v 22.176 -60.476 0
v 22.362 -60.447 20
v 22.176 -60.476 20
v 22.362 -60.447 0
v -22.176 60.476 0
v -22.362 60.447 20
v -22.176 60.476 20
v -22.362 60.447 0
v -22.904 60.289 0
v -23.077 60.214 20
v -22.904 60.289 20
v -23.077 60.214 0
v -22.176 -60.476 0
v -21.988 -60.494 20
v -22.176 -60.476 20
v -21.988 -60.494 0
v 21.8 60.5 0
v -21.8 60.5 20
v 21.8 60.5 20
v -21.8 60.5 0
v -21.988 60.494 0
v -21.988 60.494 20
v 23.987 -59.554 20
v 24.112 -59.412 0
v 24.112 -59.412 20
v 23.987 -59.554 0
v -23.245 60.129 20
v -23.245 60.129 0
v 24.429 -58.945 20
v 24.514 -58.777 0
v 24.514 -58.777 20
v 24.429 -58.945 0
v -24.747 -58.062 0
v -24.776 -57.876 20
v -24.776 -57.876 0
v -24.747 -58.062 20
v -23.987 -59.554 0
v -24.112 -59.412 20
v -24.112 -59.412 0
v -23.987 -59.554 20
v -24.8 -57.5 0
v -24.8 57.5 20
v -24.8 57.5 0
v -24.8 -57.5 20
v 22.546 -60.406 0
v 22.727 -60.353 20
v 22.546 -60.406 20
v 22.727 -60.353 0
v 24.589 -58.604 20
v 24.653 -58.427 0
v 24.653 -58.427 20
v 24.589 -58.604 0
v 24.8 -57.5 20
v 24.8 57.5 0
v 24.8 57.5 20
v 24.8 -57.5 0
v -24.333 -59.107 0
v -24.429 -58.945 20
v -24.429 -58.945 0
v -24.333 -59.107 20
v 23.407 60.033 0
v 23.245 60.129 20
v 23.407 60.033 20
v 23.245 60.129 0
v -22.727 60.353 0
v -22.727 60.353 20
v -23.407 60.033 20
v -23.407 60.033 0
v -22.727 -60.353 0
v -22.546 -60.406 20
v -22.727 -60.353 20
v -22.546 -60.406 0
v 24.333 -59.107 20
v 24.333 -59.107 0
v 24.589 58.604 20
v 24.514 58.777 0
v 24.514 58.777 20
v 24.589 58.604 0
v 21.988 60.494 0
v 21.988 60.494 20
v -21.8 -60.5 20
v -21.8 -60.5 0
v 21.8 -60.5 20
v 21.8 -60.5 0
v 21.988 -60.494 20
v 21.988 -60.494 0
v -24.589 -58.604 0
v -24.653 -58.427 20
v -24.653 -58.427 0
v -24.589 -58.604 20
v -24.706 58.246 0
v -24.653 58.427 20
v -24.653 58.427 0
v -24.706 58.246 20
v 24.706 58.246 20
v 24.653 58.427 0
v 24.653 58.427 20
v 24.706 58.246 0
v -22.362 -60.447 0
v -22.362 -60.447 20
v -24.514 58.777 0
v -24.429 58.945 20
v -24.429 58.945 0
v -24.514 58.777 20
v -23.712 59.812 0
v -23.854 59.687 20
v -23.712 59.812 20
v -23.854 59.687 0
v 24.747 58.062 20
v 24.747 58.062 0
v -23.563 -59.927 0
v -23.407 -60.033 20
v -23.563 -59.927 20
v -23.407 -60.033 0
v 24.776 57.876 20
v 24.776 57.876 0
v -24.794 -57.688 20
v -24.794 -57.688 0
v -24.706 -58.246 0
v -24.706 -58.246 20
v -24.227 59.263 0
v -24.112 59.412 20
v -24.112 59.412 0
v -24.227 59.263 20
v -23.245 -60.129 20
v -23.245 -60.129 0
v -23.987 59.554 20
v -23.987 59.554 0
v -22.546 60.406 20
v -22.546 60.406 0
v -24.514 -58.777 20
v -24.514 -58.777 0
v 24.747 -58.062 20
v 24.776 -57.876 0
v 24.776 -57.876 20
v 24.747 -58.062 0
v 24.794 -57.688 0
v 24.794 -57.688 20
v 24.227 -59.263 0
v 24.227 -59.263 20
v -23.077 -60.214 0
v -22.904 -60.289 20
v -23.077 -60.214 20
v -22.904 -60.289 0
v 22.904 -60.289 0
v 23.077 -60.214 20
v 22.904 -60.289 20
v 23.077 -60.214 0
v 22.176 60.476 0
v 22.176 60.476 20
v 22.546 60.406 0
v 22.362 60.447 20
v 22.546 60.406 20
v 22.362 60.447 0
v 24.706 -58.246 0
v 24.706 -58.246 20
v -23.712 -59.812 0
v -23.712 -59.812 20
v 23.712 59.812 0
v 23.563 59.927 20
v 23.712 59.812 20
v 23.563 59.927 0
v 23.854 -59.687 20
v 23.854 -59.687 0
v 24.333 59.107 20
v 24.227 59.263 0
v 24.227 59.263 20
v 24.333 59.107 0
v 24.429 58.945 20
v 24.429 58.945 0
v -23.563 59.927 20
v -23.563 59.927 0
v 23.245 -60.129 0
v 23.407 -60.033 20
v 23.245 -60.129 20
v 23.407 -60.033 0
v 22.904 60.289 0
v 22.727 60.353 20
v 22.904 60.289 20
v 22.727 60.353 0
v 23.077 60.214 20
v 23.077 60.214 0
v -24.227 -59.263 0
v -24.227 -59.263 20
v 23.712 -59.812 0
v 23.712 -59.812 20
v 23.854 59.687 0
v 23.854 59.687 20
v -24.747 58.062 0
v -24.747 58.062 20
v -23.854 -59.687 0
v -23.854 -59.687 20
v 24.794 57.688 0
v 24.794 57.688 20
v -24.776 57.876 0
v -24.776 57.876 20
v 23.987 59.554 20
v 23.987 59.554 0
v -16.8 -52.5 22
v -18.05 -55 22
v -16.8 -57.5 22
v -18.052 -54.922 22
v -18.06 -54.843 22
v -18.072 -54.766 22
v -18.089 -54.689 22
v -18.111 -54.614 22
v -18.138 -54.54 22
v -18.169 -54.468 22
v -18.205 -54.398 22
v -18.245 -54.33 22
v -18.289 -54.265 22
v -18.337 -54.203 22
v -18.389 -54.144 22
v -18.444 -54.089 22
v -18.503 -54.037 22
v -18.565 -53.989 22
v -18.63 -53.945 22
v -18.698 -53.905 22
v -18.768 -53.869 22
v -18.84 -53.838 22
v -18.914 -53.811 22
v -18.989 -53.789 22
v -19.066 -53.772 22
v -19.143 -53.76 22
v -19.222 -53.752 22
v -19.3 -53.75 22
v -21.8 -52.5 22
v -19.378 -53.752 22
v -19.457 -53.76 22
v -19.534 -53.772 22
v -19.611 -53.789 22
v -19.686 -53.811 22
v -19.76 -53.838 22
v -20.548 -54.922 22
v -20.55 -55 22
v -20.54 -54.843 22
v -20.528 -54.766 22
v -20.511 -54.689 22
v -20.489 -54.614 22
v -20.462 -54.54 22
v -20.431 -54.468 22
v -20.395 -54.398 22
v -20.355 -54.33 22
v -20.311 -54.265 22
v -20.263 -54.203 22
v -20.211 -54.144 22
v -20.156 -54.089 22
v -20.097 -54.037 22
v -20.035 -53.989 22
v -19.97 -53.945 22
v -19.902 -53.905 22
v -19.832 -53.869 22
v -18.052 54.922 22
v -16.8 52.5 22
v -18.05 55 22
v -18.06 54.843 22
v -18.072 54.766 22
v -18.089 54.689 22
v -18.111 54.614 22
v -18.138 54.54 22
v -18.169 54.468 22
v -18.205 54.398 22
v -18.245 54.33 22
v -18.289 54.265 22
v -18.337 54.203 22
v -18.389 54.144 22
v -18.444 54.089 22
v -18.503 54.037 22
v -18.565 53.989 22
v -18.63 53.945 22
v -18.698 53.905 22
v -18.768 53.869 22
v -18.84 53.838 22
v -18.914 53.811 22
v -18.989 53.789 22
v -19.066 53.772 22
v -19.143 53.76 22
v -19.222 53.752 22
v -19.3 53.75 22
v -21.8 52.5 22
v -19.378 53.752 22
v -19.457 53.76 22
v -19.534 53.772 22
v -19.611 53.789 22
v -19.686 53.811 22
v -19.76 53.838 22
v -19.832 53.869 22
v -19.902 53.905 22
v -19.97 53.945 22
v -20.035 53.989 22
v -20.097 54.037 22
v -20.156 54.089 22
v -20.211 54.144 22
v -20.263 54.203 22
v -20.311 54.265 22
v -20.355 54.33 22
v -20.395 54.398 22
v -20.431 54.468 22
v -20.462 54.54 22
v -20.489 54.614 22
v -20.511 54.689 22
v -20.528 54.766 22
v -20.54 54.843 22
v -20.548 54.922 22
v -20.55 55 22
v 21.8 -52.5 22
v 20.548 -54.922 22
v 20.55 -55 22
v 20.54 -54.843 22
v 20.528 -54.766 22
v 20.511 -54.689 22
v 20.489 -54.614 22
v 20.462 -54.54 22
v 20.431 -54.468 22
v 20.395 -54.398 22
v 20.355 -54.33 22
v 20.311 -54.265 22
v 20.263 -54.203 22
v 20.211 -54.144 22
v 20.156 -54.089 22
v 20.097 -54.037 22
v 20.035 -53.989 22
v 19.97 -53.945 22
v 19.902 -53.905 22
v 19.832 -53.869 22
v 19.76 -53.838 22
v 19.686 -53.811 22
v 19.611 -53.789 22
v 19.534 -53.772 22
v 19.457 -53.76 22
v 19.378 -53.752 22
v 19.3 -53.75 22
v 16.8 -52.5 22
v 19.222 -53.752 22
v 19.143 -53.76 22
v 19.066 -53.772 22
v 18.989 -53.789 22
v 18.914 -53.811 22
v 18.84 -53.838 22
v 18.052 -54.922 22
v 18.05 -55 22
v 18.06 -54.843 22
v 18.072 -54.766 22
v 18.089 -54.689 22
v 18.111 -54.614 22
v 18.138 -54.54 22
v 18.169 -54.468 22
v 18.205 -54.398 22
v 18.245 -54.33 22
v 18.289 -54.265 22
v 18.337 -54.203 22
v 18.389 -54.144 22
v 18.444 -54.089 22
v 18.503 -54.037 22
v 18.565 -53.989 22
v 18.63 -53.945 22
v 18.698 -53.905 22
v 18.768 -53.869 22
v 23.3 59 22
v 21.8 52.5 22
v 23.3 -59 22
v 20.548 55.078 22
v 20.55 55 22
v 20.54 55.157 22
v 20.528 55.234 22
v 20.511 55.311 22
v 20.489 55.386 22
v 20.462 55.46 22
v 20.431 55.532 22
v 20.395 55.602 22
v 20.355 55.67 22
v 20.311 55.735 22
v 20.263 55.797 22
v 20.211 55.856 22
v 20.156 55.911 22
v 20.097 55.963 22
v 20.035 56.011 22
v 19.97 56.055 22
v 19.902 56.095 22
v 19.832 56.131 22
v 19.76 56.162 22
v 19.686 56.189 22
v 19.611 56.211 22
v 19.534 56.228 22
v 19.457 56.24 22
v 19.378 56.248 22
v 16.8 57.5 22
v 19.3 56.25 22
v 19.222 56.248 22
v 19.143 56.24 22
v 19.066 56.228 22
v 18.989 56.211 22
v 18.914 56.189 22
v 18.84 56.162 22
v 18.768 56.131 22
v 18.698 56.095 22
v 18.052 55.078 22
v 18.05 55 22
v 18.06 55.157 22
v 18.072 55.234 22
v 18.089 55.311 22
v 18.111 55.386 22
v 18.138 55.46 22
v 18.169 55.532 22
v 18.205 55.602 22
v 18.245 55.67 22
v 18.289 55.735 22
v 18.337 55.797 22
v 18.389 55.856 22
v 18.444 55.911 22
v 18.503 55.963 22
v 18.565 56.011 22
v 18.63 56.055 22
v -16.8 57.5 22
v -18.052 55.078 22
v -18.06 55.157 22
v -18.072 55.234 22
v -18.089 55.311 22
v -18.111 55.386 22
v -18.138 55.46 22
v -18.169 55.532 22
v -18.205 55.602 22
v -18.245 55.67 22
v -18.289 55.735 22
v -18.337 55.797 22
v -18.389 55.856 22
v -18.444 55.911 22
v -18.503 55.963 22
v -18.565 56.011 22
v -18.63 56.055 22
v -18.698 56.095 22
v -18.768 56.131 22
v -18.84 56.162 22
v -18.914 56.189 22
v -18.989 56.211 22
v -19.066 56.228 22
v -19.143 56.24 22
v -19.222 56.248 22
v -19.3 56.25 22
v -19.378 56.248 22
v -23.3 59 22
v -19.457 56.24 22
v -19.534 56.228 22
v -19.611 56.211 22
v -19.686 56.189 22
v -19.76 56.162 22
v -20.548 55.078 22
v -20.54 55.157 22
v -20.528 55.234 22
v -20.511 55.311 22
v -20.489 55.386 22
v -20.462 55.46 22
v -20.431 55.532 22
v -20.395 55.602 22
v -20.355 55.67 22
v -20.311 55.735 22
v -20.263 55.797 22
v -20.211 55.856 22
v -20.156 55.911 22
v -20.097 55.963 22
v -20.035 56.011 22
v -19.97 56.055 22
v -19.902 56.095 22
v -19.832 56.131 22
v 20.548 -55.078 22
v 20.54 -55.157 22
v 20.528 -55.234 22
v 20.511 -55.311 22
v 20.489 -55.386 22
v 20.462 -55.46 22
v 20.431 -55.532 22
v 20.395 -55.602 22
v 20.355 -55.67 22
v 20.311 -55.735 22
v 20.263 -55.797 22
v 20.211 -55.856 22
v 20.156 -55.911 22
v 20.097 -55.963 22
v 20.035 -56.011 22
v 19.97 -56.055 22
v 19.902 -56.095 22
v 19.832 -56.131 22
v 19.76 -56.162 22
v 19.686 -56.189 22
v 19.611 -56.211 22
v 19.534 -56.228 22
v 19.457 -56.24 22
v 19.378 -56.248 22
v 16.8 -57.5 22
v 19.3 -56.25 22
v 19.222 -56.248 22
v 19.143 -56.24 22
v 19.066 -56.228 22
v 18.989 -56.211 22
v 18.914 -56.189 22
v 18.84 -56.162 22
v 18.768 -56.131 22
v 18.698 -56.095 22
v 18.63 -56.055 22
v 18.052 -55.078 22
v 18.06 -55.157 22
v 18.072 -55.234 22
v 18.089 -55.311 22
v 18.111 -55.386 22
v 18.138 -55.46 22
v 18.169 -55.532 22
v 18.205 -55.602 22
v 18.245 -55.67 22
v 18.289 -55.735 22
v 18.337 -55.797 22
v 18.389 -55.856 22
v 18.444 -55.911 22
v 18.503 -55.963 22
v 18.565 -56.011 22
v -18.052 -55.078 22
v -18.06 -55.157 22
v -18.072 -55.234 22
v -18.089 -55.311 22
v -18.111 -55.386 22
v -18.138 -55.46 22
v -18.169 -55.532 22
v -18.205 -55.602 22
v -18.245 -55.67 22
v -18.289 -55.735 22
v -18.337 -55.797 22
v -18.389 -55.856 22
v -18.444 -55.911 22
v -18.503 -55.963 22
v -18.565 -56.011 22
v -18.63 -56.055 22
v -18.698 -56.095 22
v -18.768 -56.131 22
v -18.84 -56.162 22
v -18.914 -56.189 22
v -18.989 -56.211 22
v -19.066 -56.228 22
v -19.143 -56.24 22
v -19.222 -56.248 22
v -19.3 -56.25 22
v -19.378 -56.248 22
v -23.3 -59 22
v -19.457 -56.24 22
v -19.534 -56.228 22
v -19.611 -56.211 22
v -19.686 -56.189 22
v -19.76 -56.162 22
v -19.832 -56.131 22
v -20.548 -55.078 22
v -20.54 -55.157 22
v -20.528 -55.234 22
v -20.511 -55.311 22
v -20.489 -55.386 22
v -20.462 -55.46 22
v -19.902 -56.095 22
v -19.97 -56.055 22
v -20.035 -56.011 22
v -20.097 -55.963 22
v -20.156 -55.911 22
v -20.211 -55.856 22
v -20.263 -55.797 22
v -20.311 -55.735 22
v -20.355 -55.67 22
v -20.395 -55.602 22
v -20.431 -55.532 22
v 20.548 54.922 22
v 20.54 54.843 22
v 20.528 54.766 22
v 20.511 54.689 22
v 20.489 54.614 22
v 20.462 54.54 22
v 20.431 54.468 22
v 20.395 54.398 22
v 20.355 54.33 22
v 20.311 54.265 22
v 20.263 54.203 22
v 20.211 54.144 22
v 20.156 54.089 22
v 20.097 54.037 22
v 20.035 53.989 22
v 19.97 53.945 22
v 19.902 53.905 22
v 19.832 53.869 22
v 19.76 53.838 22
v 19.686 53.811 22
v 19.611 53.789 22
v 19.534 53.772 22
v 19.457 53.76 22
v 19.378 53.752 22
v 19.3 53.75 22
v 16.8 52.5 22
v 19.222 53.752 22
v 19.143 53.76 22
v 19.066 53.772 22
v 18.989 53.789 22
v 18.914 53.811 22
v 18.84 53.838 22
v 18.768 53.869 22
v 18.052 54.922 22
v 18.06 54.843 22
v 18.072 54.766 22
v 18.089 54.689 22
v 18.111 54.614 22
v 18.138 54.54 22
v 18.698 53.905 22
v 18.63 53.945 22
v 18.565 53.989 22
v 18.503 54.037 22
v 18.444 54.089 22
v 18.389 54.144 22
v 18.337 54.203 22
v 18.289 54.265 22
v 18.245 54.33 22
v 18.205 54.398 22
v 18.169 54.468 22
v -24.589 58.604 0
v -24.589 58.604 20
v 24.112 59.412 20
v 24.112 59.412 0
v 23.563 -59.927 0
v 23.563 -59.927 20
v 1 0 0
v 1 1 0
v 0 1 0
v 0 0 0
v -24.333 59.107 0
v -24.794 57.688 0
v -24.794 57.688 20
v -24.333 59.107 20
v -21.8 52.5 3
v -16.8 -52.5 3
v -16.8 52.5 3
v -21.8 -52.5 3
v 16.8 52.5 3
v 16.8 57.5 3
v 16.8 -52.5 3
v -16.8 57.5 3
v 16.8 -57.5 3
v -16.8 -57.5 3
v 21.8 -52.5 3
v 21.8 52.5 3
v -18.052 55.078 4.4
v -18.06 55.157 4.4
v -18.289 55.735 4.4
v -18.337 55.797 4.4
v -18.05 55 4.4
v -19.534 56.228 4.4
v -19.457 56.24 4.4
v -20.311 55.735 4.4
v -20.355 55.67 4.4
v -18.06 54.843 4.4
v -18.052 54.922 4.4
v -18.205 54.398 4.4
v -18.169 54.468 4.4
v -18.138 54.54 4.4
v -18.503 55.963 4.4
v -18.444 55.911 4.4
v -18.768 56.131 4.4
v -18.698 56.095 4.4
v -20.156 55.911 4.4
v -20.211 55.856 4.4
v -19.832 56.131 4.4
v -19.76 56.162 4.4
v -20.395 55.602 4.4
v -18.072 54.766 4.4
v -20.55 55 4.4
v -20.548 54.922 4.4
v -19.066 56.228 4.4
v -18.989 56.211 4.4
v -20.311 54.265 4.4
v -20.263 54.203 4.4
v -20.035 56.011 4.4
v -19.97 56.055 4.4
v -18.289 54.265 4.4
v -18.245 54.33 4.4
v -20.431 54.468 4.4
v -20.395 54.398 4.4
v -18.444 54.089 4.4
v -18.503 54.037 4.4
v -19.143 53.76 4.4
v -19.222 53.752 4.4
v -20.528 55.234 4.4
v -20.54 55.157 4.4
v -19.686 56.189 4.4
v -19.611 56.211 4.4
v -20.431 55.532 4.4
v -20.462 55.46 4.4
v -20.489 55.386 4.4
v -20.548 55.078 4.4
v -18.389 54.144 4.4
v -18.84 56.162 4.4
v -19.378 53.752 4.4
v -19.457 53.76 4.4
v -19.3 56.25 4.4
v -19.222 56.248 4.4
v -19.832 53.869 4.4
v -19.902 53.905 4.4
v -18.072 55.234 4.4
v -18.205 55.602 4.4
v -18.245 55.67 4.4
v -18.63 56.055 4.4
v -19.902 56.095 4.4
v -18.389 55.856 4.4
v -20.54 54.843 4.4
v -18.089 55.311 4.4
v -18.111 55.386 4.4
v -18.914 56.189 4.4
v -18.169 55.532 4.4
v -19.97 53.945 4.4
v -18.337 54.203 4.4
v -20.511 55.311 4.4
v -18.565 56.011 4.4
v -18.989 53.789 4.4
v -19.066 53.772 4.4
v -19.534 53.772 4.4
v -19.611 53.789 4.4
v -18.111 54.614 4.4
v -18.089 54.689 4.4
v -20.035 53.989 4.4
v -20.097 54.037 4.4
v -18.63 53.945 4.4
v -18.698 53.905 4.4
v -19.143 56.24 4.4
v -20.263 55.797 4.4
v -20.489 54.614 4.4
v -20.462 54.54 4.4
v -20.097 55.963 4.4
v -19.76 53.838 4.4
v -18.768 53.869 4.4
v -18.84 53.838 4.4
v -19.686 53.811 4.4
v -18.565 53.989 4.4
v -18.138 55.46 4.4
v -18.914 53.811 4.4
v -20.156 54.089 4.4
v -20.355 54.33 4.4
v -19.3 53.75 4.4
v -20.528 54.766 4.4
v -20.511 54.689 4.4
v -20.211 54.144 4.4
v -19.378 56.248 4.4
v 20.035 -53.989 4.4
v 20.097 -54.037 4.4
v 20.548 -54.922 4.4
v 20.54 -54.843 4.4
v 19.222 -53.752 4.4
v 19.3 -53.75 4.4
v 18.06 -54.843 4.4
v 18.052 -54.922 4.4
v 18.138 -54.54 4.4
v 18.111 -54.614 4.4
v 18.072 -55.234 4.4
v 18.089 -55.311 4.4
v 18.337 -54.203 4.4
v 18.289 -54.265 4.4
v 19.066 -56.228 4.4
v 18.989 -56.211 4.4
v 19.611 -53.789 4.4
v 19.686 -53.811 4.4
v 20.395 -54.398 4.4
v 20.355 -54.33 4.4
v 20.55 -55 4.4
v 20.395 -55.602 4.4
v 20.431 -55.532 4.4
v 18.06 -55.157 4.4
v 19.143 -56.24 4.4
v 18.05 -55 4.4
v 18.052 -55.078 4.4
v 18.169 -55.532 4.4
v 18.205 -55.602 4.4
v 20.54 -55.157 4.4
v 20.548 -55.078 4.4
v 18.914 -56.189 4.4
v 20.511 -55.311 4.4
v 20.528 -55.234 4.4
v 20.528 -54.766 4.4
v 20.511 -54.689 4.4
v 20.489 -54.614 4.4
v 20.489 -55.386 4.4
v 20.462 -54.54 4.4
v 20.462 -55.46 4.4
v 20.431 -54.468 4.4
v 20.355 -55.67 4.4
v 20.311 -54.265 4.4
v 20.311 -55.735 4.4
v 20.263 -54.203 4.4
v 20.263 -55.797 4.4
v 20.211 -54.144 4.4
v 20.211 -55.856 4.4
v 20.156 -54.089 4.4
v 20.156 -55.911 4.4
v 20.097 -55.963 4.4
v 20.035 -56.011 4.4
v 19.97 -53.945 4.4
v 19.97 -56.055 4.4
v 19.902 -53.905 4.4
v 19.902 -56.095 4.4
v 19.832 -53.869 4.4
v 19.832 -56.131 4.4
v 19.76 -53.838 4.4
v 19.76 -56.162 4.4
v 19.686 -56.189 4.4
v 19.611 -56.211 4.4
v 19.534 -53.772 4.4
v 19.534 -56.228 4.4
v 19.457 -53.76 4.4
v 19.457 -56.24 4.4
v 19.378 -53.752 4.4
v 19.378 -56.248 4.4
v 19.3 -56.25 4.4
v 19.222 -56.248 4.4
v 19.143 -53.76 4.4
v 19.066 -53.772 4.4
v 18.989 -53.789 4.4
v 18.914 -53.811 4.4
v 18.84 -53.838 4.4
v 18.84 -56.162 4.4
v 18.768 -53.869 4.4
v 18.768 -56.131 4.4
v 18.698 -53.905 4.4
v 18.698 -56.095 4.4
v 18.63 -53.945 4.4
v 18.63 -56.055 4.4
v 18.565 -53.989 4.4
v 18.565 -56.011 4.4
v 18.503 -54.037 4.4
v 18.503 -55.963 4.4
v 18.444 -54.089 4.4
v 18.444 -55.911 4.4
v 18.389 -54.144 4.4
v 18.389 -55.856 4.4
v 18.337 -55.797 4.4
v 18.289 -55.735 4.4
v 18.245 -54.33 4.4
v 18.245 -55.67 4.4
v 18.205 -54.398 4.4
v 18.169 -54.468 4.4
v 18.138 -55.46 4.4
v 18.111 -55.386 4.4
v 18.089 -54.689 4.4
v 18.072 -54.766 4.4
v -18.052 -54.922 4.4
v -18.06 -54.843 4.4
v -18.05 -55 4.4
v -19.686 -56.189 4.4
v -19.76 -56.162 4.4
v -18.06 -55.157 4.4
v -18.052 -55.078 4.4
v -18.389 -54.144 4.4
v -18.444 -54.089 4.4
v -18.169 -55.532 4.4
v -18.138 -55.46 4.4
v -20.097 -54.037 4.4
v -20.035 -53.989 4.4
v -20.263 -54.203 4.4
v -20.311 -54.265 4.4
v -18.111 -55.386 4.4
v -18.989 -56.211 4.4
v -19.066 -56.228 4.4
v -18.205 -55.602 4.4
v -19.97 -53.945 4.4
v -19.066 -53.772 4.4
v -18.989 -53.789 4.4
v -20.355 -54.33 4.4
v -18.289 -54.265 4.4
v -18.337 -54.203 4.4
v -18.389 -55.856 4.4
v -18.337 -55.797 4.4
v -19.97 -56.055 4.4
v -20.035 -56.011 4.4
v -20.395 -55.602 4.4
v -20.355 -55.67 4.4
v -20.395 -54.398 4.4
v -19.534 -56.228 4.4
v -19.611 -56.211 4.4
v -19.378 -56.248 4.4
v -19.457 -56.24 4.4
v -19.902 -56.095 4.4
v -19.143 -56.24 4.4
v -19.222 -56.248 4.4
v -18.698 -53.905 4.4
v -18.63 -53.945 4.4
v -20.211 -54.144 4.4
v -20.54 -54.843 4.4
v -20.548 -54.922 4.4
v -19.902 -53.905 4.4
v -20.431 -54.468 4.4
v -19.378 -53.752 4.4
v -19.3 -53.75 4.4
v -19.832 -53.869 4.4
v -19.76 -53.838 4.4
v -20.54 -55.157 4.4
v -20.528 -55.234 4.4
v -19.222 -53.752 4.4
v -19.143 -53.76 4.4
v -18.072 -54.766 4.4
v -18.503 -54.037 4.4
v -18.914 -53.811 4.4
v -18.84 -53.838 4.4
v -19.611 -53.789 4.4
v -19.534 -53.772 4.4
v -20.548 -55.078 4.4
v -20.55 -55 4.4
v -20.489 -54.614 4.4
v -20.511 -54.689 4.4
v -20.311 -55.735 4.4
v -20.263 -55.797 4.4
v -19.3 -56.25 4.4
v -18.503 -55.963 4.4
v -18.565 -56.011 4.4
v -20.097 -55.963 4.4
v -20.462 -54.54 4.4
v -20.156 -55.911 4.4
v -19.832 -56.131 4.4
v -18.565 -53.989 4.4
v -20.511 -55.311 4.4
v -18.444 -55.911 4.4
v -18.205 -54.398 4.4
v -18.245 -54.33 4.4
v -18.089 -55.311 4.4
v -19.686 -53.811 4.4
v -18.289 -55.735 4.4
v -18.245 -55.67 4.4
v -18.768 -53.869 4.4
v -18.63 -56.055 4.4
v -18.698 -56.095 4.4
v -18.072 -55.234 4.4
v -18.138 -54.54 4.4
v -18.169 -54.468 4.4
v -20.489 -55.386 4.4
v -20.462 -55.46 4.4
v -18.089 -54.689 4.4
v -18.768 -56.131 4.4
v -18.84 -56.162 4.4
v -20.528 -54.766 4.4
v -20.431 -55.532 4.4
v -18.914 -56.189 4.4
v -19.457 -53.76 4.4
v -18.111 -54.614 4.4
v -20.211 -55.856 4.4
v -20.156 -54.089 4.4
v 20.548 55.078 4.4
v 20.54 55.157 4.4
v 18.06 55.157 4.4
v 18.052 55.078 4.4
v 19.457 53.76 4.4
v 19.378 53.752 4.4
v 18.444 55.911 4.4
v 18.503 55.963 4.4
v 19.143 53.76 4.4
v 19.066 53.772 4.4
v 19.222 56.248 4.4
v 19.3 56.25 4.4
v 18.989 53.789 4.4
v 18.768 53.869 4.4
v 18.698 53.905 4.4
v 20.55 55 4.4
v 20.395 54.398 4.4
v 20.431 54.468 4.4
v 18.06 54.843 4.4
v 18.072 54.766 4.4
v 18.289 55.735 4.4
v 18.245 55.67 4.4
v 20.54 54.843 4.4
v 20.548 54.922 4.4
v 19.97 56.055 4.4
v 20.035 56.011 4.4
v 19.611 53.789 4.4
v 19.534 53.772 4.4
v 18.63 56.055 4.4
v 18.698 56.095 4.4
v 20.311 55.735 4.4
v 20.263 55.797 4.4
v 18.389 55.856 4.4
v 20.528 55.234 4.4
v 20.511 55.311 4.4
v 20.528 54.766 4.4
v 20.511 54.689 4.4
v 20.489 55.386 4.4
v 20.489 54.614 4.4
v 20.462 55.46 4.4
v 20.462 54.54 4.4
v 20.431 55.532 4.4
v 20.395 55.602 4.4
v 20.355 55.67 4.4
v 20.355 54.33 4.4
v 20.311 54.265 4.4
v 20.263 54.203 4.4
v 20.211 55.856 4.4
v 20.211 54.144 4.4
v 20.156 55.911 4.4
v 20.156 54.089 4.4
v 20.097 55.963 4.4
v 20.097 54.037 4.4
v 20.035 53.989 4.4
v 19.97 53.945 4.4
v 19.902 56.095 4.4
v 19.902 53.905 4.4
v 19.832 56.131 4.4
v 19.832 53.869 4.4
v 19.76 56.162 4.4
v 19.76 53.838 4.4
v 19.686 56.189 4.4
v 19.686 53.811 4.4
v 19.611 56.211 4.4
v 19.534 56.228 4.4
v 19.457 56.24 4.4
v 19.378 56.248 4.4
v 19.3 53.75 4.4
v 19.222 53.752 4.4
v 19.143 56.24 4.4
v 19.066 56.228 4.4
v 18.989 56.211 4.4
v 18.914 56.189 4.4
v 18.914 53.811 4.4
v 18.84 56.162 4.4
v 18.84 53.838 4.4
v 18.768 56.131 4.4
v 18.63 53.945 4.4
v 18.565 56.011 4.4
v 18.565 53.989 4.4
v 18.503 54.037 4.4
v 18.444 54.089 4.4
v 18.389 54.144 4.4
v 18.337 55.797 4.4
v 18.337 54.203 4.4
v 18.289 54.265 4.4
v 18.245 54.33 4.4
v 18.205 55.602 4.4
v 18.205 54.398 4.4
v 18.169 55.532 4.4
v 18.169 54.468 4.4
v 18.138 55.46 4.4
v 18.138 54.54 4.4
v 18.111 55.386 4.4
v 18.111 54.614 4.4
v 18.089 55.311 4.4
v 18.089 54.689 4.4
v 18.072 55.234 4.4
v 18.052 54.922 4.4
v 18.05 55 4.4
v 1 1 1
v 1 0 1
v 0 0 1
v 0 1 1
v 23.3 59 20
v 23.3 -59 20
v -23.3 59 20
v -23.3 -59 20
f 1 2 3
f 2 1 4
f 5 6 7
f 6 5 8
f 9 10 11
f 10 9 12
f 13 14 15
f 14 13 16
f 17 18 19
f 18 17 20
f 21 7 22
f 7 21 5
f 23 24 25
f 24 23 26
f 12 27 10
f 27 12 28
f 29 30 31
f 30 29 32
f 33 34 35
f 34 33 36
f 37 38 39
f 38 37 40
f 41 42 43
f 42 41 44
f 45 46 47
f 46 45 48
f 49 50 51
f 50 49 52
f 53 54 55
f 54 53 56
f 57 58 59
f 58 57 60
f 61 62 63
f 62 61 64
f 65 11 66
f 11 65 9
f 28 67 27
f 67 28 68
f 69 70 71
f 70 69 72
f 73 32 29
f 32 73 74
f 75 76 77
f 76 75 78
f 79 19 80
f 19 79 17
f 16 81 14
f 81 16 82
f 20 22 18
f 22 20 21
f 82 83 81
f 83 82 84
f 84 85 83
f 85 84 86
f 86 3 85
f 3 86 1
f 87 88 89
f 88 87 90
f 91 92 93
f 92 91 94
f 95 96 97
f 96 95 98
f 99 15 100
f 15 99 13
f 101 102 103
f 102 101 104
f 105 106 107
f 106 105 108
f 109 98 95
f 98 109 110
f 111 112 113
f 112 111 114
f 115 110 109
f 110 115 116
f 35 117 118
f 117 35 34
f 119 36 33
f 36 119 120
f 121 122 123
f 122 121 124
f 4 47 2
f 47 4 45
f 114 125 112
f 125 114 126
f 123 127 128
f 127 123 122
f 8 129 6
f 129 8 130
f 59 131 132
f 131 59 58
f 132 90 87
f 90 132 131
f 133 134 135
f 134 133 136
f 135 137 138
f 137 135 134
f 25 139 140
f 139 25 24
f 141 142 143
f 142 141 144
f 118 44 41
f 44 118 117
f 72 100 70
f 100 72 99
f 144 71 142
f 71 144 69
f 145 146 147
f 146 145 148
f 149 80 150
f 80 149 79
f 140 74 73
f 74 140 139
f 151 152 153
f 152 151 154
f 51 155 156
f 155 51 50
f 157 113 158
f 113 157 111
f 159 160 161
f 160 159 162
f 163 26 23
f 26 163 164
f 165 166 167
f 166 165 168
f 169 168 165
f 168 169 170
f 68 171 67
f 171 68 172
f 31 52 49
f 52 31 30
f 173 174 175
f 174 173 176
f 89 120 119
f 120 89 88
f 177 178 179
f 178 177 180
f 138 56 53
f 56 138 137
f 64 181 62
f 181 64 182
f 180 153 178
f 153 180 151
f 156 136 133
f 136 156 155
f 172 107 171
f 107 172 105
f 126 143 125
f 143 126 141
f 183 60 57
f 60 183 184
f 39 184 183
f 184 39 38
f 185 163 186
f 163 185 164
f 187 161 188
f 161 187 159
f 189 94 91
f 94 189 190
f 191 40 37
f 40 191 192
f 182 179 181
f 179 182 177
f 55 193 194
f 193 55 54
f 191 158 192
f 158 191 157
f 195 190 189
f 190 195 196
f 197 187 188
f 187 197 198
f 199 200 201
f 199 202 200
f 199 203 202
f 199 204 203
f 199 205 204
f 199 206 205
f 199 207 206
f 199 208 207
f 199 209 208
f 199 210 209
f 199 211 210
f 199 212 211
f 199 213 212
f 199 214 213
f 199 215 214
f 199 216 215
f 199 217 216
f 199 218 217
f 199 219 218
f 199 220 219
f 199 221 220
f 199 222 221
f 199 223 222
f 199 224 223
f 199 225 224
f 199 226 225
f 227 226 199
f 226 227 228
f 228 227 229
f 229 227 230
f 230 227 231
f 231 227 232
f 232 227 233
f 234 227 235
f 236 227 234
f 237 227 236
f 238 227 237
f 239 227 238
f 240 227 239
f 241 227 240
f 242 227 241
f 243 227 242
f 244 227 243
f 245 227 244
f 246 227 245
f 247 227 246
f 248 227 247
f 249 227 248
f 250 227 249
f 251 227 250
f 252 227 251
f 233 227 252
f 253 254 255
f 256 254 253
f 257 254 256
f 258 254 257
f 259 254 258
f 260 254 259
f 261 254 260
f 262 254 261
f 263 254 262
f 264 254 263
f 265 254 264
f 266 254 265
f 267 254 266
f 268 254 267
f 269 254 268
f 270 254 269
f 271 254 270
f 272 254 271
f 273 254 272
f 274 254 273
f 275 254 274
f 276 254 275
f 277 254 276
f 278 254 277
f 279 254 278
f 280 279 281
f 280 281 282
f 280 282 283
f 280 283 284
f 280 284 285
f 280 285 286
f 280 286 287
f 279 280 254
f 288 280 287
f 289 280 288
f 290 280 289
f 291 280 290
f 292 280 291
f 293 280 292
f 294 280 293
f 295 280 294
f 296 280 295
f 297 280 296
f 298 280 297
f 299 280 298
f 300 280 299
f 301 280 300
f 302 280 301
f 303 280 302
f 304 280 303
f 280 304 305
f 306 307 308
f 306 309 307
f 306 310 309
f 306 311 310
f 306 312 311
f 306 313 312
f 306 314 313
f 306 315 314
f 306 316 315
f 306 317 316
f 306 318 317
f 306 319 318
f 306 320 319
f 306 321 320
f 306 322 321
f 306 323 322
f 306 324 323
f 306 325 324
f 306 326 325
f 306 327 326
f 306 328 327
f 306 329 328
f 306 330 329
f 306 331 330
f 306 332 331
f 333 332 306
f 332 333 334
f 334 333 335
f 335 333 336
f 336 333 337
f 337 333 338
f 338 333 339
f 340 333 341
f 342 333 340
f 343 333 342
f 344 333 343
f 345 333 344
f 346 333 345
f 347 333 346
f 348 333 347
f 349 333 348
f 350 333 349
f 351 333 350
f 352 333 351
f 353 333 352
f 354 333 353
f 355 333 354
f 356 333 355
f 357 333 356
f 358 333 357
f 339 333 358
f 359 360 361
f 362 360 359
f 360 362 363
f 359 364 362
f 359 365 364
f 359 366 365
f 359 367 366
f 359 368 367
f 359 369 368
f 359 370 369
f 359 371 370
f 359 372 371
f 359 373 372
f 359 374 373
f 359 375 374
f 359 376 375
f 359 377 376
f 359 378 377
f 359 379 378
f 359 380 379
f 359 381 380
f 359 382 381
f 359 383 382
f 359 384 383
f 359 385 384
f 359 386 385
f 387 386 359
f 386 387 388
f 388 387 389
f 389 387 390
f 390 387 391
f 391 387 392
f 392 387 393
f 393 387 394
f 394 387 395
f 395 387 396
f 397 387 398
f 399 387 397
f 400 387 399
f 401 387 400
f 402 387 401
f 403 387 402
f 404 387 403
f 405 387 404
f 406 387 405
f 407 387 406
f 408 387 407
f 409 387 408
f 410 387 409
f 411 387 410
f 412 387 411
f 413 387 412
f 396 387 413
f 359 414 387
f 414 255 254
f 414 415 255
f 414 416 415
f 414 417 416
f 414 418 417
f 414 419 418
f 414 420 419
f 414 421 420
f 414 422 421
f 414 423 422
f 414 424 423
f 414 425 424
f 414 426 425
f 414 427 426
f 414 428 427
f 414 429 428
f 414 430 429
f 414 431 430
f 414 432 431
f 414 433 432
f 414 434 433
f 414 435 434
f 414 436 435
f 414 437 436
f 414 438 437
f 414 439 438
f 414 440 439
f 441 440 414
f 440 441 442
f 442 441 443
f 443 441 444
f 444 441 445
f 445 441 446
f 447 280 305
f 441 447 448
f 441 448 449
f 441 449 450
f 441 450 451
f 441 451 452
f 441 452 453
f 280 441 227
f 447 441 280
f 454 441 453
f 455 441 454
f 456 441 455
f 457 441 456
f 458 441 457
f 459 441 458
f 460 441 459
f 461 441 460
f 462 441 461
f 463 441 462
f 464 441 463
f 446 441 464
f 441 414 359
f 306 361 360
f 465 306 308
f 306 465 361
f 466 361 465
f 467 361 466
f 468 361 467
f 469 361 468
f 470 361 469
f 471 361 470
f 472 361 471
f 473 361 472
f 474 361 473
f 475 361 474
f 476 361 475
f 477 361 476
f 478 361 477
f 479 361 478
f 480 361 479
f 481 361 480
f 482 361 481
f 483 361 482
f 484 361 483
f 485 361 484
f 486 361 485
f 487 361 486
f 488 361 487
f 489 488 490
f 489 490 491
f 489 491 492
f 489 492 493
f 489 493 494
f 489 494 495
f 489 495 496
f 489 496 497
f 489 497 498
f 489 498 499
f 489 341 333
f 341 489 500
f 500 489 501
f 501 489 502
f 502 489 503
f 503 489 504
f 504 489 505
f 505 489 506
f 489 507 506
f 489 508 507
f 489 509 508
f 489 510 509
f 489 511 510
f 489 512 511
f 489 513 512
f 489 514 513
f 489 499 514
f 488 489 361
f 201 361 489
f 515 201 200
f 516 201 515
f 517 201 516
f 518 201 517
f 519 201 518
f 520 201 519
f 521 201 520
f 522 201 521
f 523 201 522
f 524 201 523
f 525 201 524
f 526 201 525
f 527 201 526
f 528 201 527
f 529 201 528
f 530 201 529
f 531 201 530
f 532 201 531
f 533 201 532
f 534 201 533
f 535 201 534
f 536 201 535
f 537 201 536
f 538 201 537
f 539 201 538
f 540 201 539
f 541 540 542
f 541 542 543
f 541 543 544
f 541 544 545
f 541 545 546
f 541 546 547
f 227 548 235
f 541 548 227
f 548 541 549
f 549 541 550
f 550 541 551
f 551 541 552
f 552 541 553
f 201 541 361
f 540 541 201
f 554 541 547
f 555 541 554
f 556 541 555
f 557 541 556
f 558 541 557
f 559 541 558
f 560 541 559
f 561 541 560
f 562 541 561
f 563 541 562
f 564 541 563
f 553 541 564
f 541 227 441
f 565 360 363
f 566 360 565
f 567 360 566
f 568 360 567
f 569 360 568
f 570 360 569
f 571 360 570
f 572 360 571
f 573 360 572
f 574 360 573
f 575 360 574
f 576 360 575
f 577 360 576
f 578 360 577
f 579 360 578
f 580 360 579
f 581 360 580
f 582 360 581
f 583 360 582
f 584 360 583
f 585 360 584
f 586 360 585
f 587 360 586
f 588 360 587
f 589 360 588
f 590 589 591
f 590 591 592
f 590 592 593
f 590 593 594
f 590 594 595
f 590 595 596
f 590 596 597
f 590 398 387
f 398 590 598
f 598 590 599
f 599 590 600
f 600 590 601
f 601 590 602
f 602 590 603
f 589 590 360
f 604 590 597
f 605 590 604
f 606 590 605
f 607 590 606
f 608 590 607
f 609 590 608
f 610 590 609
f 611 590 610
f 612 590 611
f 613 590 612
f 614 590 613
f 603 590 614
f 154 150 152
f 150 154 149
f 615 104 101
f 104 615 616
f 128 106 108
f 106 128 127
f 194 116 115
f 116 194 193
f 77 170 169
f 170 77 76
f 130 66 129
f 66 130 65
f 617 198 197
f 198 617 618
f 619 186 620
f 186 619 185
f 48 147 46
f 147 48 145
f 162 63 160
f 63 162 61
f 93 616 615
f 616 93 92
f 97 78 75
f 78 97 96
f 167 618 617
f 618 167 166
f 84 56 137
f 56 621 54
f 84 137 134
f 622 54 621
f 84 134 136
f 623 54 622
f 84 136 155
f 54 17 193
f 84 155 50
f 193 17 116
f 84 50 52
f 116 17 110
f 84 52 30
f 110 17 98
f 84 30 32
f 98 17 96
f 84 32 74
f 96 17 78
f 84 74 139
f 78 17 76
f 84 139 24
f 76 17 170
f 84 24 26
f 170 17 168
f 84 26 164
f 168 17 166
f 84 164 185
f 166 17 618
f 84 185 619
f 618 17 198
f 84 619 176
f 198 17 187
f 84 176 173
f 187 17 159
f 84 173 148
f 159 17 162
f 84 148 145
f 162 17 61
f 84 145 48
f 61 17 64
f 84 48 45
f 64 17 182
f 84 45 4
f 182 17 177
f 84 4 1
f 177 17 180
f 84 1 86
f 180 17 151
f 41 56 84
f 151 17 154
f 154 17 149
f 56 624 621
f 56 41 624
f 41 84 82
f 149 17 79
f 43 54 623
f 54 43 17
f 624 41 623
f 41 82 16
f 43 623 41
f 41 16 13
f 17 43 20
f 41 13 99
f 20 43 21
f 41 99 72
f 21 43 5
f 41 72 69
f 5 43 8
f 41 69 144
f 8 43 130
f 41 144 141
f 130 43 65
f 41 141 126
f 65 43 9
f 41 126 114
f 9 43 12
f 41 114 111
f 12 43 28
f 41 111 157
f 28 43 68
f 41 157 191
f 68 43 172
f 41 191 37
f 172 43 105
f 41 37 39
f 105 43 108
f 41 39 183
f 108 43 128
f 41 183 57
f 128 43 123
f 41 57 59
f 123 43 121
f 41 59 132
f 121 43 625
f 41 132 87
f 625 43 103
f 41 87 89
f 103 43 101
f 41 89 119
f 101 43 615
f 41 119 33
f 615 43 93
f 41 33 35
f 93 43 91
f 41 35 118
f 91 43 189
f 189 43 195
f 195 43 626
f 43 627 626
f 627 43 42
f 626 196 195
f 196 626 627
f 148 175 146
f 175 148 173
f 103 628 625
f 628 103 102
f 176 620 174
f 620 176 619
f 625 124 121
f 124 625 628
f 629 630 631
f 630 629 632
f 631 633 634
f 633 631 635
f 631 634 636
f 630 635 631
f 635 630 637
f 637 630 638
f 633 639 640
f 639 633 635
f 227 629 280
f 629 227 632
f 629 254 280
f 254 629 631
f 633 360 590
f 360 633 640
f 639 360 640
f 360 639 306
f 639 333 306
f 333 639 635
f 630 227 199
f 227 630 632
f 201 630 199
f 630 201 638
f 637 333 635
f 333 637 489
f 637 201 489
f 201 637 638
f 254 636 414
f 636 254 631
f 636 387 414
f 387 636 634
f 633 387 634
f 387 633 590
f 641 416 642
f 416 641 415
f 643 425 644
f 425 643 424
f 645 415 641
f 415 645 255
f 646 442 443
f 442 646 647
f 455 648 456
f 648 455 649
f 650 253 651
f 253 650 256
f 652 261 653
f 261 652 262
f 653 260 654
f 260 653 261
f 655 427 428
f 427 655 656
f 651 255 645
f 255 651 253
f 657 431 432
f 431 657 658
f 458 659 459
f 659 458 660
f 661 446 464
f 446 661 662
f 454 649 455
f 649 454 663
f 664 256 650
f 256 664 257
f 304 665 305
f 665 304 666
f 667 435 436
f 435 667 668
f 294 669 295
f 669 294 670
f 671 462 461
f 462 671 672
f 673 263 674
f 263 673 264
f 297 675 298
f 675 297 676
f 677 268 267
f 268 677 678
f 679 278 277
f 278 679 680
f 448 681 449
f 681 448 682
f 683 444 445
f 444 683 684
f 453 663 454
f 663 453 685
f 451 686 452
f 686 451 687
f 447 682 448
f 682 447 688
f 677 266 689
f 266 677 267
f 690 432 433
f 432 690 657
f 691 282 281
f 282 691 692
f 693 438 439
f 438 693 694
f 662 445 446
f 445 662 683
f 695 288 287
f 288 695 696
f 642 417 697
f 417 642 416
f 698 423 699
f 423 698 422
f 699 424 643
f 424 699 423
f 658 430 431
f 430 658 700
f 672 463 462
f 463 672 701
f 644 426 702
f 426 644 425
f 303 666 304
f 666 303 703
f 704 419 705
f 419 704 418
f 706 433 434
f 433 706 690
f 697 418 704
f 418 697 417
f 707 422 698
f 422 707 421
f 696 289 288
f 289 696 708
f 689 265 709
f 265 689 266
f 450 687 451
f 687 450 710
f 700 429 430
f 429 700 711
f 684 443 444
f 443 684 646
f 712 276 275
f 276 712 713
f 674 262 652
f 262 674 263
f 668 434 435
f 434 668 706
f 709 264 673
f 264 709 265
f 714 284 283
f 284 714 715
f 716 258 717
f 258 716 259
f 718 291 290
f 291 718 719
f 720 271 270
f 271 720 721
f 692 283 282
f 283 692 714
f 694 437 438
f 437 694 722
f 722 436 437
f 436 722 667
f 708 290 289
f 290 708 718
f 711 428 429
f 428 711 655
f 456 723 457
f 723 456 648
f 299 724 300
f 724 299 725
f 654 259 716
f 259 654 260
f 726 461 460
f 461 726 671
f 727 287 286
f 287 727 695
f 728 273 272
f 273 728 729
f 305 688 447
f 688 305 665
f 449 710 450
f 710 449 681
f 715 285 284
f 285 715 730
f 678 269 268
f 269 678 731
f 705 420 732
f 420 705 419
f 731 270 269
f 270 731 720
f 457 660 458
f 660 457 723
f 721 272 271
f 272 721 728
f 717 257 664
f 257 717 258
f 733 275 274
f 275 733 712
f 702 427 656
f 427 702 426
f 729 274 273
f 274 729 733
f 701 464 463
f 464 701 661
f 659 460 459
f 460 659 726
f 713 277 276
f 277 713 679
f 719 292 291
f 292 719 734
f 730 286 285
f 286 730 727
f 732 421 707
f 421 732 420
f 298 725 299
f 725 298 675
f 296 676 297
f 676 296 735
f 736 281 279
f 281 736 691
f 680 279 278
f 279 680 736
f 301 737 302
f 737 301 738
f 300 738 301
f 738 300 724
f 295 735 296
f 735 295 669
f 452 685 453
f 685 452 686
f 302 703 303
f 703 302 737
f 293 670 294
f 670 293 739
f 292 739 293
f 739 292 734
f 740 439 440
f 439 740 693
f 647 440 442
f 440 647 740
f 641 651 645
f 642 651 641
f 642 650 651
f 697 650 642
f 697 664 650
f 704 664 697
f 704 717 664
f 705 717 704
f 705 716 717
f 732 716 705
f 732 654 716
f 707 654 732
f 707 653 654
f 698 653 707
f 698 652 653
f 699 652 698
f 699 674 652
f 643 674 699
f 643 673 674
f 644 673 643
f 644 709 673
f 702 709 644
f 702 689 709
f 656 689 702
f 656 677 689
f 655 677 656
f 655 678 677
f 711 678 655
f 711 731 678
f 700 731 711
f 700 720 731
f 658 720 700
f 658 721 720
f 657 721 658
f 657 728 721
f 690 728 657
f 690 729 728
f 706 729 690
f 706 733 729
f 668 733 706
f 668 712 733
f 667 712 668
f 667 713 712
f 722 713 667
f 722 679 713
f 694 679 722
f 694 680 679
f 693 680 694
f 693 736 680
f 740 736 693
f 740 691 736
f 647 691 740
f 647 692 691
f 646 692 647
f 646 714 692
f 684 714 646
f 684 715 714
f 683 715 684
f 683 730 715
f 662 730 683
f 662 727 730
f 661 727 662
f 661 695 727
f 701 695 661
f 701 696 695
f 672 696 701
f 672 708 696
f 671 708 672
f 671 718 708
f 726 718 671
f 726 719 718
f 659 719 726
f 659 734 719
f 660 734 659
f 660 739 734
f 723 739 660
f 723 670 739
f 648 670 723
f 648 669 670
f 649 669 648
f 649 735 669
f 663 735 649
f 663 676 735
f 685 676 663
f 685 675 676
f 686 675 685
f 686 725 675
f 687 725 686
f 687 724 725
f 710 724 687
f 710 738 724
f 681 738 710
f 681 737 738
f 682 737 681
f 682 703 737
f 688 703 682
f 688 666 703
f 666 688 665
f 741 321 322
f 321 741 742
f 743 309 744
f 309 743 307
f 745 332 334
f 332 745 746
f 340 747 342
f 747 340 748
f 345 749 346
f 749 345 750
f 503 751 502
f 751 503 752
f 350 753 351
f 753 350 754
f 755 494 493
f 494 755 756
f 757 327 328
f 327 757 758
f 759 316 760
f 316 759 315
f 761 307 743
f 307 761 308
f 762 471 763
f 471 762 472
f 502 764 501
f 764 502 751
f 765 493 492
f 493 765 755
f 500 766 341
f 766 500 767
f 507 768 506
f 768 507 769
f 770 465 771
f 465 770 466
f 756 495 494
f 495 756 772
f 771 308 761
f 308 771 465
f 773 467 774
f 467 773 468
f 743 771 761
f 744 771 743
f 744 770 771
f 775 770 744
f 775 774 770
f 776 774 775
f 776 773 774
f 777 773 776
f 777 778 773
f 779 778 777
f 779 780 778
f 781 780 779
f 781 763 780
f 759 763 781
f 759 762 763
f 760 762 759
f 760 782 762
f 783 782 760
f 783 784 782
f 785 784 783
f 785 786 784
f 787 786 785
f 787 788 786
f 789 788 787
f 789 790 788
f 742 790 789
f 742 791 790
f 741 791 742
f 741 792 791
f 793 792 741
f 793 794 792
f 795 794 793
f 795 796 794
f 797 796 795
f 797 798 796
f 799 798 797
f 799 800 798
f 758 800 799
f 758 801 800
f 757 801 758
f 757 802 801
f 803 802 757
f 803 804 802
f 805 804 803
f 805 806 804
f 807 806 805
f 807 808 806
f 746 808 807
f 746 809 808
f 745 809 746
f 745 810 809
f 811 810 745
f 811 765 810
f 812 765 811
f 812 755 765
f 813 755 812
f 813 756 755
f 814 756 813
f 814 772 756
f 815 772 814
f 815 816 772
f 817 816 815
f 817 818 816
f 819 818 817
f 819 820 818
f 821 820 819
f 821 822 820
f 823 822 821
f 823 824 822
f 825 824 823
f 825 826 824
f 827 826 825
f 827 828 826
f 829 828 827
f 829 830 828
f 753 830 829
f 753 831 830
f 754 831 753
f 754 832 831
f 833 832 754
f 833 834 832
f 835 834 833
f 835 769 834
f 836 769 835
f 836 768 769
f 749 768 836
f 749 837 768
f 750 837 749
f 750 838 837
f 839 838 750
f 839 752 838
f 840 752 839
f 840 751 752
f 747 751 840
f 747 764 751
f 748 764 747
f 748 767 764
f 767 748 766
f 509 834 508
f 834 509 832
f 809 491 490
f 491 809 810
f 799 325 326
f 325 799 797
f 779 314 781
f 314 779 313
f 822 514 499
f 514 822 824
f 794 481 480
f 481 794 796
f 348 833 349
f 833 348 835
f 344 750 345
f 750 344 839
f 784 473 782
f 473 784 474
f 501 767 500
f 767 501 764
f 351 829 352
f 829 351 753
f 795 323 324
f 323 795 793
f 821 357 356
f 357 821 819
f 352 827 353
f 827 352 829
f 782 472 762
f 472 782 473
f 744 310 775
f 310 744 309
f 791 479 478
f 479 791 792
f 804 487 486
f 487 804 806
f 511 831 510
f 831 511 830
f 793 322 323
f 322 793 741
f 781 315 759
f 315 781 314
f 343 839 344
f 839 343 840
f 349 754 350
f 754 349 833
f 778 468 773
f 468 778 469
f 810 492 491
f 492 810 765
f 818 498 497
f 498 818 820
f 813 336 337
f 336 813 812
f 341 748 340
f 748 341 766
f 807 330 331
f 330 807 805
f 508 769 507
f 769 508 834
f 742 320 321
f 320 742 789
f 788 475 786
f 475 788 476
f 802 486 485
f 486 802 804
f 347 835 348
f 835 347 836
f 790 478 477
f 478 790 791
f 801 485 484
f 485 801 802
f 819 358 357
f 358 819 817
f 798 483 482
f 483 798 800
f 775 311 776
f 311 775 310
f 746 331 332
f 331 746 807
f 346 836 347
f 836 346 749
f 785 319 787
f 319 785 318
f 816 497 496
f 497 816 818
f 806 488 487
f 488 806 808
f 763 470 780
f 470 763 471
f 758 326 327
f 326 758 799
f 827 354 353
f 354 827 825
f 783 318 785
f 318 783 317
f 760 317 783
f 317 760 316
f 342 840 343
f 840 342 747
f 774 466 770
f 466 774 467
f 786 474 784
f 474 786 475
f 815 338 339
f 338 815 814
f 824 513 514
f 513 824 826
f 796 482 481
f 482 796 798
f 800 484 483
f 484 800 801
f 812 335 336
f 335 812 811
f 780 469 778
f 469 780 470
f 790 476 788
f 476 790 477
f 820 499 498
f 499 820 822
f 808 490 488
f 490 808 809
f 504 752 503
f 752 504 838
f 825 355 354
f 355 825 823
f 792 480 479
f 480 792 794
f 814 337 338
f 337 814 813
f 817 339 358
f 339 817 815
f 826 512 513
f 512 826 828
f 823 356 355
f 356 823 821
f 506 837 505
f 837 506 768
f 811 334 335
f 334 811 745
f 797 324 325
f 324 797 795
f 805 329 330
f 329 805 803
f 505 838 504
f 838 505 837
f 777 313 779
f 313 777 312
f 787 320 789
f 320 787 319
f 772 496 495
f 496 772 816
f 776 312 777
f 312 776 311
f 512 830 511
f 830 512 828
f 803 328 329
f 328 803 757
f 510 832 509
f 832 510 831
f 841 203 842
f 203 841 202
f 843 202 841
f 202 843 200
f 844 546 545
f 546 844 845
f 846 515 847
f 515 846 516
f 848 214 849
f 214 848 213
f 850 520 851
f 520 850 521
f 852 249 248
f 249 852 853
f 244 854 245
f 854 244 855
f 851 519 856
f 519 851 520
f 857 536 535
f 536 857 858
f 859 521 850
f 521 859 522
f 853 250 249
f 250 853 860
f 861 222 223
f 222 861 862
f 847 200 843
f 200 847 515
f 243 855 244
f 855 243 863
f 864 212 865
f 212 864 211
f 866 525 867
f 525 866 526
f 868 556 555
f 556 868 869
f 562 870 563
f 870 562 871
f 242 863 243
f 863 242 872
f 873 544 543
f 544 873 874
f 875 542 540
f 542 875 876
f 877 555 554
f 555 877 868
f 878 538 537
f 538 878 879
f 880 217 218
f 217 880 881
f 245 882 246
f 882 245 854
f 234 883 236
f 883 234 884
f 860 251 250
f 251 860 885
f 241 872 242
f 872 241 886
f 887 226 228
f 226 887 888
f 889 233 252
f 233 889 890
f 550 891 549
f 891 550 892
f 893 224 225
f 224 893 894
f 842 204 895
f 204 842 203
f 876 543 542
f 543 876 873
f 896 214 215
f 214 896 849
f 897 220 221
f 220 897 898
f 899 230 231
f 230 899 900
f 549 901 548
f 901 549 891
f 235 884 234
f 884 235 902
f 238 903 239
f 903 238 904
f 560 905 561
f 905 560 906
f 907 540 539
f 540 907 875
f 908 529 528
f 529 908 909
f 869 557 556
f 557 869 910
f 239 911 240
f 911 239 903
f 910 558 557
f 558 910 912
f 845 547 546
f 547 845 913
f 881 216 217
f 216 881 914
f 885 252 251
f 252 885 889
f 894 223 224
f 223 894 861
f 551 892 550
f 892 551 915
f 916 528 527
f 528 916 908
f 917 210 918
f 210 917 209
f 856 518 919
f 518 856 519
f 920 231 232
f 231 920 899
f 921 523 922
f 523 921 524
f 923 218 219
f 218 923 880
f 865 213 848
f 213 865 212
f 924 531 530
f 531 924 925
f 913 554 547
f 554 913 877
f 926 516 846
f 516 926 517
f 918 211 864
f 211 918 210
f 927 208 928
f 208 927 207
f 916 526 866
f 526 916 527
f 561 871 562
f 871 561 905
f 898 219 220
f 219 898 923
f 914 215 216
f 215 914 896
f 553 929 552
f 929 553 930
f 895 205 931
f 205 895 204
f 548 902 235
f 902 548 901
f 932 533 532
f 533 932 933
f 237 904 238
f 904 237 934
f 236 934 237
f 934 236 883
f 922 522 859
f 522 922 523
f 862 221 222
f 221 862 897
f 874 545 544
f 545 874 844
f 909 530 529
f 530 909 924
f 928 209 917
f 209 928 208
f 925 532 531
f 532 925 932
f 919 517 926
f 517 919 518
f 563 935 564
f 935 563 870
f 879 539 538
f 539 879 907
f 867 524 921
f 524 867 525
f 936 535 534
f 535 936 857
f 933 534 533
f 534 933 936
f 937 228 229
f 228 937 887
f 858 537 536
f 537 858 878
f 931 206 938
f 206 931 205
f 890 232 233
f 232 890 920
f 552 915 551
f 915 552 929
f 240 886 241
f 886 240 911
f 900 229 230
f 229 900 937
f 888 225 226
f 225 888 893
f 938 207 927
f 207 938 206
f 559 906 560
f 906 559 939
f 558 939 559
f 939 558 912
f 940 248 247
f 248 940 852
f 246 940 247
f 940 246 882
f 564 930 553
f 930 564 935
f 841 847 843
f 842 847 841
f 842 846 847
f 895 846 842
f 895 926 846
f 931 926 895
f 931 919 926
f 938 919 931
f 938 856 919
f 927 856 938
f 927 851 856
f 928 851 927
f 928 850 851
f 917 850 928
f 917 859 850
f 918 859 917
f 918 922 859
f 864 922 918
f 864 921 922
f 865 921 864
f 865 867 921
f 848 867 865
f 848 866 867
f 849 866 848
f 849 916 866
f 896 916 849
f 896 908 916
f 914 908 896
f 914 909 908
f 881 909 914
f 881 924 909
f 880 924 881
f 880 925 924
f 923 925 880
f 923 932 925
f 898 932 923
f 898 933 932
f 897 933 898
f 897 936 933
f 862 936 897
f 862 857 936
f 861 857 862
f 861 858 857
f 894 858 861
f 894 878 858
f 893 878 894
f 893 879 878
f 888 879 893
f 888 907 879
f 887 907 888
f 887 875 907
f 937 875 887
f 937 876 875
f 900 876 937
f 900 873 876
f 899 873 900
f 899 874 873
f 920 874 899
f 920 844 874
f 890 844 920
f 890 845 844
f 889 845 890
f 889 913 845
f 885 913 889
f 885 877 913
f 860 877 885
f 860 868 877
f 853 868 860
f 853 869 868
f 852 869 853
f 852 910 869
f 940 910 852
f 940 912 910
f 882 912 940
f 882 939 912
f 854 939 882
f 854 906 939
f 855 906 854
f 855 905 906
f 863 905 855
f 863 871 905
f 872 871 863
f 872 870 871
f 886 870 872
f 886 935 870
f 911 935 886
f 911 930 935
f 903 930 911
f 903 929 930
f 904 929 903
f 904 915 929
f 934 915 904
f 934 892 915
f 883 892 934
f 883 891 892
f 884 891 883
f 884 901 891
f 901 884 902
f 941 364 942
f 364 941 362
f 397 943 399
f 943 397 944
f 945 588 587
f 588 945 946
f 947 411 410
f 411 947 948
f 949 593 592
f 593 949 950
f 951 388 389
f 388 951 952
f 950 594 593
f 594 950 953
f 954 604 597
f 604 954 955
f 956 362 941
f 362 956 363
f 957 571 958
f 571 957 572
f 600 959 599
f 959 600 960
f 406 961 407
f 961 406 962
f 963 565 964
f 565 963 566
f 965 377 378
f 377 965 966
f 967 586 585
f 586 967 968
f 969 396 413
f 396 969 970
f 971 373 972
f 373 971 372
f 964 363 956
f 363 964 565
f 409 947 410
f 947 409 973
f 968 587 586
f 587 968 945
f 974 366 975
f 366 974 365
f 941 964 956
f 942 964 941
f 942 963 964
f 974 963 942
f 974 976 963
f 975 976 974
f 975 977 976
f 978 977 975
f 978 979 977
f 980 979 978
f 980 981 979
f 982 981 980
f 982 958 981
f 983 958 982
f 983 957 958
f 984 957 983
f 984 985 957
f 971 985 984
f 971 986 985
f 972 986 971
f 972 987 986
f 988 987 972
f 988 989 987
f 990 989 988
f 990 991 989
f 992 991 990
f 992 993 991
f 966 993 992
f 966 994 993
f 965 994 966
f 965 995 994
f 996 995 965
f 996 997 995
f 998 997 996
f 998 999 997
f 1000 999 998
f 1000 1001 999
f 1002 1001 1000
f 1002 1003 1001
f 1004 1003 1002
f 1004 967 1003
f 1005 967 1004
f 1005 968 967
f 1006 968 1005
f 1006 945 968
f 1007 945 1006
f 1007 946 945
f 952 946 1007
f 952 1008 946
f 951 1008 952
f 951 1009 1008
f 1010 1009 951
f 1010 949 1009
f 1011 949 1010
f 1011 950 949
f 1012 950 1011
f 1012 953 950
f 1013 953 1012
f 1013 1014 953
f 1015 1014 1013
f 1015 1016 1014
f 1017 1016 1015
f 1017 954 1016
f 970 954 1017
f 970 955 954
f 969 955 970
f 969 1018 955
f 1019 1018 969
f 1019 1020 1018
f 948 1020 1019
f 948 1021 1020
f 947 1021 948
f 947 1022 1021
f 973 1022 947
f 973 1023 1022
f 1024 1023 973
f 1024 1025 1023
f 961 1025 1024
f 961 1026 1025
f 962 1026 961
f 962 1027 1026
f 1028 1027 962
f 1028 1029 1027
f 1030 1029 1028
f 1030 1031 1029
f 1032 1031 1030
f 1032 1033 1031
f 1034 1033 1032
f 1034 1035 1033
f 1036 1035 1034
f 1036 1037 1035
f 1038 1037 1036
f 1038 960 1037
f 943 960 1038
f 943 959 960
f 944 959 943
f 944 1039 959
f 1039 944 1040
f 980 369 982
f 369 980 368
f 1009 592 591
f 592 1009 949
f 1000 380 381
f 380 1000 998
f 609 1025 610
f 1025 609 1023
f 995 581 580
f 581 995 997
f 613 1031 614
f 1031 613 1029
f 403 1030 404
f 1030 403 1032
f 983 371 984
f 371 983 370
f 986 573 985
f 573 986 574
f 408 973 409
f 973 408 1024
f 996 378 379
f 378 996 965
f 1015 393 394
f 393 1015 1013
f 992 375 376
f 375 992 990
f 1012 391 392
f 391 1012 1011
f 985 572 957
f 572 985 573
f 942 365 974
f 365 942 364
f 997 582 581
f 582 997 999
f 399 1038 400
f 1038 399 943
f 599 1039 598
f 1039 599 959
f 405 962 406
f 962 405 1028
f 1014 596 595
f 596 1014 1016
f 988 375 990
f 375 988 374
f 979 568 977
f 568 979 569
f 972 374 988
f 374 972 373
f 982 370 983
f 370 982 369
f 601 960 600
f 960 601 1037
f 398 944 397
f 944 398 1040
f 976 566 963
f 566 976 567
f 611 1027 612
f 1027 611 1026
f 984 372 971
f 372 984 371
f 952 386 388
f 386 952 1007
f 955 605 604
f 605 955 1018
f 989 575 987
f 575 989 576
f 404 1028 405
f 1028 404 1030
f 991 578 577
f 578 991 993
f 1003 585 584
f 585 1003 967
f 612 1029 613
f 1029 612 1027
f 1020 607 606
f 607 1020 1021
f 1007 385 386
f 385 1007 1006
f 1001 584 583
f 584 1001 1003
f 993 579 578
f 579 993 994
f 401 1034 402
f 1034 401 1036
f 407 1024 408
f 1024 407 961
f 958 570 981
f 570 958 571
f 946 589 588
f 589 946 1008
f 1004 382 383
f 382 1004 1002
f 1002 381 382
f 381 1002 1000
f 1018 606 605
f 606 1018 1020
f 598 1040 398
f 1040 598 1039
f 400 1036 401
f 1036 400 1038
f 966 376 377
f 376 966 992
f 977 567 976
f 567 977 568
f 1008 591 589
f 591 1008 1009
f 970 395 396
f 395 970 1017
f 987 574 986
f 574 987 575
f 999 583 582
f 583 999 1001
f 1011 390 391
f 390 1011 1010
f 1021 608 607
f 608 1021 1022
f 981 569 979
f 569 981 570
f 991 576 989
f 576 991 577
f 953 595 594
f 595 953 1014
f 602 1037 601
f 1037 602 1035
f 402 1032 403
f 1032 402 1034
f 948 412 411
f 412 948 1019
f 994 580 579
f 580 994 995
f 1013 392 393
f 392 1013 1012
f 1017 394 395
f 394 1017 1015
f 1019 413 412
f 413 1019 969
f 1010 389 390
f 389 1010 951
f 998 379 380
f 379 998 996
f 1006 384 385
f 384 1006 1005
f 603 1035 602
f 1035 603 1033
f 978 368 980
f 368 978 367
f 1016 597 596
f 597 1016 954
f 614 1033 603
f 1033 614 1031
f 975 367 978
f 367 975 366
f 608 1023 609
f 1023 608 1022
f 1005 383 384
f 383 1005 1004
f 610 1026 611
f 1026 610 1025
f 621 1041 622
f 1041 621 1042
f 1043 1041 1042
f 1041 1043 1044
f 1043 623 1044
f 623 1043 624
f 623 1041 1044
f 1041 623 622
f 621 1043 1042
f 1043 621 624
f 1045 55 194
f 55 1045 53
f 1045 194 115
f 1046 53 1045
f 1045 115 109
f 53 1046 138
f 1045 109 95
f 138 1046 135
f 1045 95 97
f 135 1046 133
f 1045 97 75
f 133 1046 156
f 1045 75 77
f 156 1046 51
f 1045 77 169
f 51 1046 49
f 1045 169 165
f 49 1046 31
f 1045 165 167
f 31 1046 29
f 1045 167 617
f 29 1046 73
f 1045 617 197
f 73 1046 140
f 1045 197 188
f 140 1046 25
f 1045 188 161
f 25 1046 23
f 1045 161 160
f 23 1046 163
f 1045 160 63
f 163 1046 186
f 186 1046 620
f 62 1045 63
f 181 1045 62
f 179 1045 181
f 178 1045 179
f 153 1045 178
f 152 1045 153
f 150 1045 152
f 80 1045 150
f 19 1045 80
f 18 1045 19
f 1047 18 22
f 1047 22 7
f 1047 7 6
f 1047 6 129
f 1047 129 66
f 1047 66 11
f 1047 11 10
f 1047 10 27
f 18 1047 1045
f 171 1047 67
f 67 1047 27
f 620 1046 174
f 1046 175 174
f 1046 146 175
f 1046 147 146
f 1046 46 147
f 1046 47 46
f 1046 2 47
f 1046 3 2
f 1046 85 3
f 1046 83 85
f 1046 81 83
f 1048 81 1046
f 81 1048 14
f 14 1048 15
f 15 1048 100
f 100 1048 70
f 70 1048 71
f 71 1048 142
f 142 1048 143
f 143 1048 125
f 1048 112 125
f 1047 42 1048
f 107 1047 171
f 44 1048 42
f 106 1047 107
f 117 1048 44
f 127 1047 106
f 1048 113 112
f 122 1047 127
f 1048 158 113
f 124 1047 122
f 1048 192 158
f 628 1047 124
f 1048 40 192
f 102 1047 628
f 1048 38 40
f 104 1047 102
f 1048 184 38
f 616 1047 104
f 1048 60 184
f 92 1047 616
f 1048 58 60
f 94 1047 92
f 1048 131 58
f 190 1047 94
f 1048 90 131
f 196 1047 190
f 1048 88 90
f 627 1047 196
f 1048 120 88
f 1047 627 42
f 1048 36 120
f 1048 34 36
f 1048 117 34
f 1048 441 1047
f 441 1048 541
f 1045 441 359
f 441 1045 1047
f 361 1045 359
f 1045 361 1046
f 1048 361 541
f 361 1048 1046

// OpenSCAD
$fn = 100; // resolution

clearance=0.25; //clearances for 3D printing to make parts easily fit where needed
// width = 38.6+3; //width of the case(X)
// width = 68.6+3; //width of the case(X)
width = 40.6+3;


//depth = 53.3+3; //depth of the case (Y)
depth = 105; //depth of the case (Y)
depthSpace = 5; //little space on both sides of the case to store loose wires and make it easier to fit components
height = 22; //height of the case (Z)
//height = 25;
indentHeight = 2; // tells us how far the cover overlaps the case
wallWidth = 3; // wall width

//union()
//    {
difference(){
    difference() {
        //build a box
   
        // cut a working area space
        difference() {
        //build a box
            color([.5,.5,.5]) linear_extrude(height, convexity = 10) {
                offset(r = wallWidth)
                square([width, depth + (2 * depthSpace)], true);
            };

            // cut a working area space
            translate([0, 0, wallWidth]) linear_extrude(height,         convexity = 10) square([width, depth], true);
        }
        // cut a space on the sides of the working area
        // can be used to hold an excess wires
        for (i = [-1, 1])
          translate([0, i * (depth / 2 + depthSpace / 2),   wallWidth]) linear_extrude(height, convexity = 10) square([width - 2 * depthSpace, depthSpace], true);
        
        
        for (i = [
            [-1, 1],
            [1, -1],
            [-1, -1],
            [1, 1]
        ])
      translate([i[0] * (width / 2 - depthSpace / 2), i[1] * (depth / 2 + depthSpace / 2), height - 4 / 5 * height]) linear_extrude(4 / 5 * height, convexity = 10) circle(d = 2.5);
    }
    translate([0, 0, height - indentHeight])
    linear_extrude(indentHeight, convexity = 10) 
    difference() {
      offset(r = wallWidth) 
        square([width, depth + 2 * depthSpace], center = true);
        square([width + wallWidth, depth + 2 * depthSpace + wallWidth], center = true);
    }
    
    
    
    
    // ranuras de salida
        squareXHole = [
        [
          [ -wallWidth, 31.7, wallWidth + 1 ],
          [ wallWidth + 0.001, 11.43 + 2, 10.8 + 2 + 50 ]
        ], // usb port
        [
          //[ -wallWidth, 3.3, wallWidth + 3 ],
          //[ wallWidth + 0.001, 8.9 + 2, 10.8 + 2 + 50 ]
        ] // power plug
        ];
    //width,height add 0.001 to remove OpenSCAD's zero-width wall-when-difference same width artifact
    for (i = squareXHole)
        color("red") translate(i[0]) cube(i[1]);
    
    }



        /*pcbScrewPositions = [
            [ 15.97, 16.54, wallWidth ],
            [ -15.97, 16.54, wallWidth ],

            [ 15.97, -20.54, wallWidth ],
            [ -15.97, -20.54, wallWidth ],

           // [ -15.24, -50.8, wallWidth ],
            //[ -66.2, -35.56, wallWidth ],
            //[ -66.2, -7.62, wallWidth ]
        ];
        // add screw hole insets
        for (i = pcbScrewPositions) {
            translate([ i[0], i[1], i[2] ]) cylinder(h = 2.5, r1 = 5.5 / 2, r2 = 4.5 / 2);
            translate([ i[0], i[1], i[2] + 2.5 ]) cylinder(h = 3, r = 1.2);
        }
    }*/
    
    
module dovetail(max_width = 5, min_width = 3, depth = 5, height = 20) {
  linear_extrude(height = height , convexity = 2) polygon(paths = [
    [0, 1, 2, 3, 0]
  ], points = [
    [-min_width / 2, 0],
    [-max_width / 2, depth],
    [max_width / 2, depth],
    [min_width / 2, 0]
  ]);
  echo("angle: ", atan((max_width/2-min_width/2)/depth));
}
//dovetail();
